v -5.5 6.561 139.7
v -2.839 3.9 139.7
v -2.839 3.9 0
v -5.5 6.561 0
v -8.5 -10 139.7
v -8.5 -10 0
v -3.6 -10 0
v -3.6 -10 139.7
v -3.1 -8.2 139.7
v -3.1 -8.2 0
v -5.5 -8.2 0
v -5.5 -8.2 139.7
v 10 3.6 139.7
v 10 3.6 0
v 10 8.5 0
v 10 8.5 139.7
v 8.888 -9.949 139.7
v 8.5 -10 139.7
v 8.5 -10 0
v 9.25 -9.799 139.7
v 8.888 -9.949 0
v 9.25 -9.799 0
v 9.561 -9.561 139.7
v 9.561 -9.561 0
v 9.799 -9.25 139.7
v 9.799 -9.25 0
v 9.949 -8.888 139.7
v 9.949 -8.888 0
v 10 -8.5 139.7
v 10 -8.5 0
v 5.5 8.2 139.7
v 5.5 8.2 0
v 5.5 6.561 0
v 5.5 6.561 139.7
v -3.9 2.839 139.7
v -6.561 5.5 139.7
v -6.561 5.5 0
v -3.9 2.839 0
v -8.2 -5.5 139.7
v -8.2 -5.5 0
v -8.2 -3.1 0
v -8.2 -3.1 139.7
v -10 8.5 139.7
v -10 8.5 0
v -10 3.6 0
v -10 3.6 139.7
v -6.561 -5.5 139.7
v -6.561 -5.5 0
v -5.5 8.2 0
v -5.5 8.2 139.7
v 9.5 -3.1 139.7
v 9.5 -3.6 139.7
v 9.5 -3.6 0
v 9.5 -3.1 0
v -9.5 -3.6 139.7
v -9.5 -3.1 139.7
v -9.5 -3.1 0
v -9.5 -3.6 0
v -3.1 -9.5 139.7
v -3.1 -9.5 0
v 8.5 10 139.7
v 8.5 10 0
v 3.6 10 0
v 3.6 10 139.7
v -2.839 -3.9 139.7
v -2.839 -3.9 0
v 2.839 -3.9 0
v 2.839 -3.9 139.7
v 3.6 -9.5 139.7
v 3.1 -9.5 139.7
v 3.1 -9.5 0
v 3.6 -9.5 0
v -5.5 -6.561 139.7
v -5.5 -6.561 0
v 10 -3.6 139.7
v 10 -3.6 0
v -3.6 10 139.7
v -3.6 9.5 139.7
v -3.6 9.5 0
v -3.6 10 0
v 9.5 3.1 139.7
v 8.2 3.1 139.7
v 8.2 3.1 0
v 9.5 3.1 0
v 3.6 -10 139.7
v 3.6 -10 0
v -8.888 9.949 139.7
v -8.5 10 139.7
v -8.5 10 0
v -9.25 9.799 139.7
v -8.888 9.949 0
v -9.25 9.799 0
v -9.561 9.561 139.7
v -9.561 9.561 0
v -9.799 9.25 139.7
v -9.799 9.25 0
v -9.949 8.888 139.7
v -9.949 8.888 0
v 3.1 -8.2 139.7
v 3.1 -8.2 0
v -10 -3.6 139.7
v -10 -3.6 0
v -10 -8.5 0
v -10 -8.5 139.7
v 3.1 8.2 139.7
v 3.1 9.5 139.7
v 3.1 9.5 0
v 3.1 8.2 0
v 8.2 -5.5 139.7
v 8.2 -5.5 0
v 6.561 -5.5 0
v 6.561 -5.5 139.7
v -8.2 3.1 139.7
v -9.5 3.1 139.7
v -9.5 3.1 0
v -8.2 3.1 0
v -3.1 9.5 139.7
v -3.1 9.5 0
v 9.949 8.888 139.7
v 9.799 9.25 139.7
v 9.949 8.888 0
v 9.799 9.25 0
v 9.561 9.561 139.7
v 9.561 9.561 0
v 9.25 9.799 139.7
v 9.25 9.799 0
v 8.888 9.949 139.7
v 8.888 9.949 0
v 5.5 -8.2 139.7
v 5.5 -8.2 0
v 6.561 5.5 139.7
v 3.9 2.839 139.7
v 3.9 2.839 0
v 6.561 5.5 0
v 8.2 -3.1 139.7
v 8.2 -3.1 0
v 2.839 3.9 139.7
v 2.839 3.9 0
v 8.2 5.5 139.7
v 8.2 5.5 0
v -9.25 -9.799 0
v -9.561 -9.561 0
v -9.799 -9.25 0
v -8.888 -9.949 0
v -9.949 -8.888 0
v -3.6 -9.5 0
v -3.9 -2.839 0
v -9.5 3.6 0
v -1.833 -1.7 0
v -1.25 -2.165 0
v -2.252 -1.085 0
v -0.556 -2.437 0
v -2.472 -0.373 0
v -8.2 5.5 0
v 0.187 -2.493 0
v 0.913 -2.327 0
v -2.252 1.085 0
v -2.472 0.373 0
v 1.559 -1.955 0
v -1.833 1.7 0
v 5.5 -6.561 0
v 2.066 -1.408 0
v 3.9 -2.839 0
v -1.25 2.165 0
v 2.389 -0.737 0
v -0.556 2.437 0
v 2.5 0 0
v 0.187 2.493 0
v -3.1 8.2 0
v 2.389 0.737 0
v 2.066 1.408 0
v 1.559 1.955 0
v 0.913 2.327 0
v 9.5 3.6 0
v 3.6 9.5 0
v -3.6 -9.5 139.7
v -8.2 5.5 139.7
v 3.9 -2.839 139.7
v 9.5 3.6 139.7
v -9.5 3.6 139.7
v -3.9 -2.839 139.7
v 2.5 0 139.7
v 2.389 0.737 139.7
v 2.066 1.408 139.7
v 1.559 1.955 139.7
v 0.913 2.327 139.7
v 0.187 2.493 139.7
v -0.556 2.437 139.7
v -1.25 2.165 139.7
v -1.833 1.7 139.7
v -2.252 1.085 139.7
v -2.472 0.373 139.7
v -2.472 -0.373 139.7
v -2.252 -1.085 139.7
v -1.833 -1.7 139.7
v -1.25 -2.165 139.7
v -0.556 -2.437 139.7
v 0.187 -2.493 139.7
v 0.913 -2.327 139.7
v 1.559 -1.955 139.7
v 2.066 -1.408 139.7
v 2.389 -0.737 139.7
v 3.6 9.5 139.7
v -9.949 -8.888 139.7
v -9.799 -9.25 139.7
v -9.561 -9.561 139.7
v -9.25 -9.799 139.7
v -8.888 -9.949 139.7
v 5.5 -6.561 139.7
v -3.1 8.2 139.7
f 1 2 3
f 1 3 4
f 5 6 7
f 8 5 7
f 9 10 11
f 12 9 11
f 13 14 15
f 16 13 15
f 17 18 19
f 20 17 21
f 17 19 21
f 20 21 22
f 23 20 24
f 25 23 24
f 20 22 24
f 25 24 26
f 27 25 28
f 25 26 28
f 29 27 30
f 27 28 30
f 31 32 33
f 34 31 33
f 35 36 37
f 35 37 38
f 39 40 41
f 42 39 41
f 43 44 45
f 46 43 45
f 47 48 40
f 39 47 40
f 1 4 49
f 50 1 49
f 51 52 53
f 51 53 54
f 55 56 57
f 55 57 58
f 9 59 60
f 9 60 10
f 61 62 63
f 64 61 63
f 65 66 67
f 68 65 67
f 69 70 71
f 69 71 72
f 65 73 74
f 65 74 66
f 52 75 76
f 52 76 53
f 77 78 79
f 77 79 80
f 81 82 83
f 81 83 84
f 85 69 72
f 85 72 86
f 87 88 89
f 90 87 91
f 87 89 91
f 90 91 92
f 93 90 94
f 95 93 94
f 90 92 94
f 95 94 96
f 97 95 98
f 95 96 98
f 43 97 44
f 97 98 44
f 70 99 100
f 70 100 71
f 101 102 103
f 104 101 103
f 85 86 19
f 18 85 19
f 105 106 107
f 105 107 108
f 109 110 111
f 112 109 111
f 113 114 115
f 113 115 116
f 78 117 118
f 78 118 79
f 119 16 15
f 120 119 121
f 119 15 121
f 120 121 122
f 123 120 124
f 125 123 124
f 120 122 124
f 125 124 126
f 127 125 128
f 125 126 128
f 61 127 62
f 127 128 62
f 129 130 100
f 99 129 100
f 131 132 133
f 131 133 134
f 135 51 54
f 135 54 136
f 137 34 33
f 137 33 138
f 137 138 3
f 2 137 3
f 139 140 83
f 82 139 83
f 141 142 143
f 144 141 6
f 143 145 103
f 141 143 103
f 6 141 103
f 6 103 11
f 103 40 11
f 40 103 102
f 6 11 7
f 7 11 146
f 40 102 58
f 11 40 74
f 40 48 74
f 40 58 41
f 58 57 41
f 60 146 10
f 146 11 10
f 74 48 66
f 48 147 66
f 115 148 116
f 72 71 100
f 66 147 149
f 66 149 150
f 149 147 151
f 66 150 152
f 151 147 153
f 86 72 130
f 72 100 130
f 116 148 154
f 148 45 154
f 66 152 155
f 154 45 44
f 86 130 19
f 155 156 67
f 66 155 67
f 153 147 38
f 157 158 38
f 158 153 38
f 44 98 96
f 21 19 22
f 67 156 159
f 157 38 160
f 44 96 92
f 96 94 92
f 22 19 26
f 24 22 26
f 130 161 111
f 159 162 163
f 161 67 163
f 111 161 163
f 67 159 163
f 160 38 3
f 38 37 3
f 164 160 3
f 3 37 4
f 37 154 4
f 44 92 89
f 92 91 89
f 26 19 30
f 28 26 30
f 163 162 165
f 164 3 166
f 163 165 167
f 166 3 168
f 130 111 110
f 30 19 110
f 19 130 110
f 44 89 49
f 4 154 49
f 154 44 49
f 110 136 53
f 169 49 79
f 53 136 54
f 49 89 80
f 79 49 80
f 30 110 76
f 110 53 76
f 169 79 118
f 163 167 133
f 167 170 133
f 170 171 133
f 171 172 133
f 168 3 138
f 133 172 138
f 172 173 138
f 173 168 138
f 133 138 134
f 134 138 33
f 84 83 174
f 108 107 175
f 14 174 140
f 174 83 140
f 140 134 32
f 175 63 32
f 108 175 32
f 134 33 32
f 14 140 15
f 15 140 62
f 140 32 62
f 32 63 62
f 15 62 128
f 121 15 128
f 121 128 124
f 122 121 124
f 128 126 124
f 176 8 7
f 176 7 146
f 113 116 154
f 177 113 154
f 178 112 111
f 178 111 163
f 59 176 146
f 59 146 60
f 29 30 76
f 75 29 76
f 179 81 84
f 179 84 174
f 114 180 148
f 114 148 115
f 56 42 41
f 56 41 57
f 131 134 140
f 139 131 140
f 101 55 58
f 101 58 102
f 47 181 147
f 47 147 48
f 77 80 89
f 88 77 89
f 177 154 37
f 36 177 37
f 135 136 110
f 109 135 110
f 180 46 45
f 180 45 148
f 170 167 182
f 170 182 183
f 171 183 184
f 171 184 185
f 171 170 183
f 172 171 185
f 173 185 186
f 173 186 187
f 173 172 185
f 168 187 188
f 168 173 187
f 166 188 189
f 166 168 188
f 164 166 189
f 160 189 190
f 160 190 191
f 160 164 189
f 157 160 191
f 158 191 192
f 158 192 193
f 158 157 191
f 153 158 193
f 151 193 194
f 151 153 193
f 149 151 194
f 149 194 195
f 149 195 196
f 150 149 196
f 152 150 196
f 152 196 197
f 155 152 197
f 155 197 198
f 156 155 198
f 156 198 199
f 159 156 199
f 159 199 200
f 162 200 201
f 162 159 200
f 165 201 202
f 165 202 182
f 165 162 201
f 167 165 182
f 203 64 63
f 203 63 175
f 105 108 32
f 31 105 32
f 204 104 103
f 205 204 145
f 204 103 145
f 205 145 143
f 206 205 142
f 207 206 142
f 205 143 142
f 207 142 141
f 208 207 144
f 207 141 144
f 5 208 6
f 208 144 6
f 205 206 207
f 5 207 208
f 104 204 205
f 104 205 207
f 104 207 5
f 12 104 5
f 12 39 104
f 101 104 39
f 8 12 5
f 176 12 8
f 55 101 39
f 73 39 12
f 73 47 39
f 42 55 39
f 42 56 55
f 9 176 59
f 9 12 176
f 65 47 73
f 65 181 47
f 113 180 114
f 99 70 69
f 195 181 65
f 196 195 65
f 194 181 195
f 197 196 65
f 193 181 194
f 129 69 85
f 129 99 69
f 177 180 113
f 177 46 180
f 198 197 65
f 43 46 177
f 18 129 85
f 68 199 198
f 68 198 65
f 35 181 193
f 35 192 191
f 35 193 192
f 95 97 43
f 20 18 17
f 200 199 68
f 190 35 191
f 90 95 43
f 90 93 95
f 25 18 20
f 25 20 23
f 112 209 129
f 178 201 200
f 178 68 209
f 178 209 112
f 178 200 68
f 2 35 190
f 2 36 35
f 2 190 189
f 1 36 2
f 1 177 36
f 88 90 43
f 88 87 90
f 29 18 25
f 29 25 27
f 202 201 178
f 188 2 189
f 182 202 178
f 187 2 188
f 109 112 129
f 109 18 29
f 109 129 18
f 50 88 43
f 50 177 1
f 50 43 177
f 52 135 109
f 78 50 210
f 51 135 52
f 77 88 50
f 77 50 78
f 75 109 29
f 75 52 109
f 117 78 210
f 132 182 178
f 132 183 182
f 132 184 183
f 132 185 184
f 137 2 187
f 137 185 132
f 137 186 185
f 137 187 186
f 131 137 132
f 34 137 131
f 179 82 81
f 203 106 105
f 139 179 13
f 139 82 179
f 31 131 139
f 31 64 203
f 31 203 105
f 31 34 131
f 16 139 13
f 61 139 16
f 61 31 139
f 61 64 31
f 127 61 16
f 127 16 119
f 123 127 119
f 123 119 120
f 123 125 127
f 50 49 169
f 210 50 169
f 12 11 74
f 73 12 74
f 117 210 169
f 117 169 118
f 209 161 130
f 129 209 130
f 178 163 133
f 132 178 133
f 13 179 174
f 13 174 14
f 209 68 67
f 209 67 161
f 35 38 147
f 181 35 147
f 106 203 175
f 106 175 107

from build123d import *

# Parameters (mm, degrees)
SKETCH1_R           = 2.5
BOSS_EXTRUDE1_DEPTH = 139.7


with BuildPart() as part:
    # Sketch1 → Boss-Extrude1 (new body)
    with BuildSketch(Plane.XY):
        with BuildLine():
            Line((-10, -3.6), (-10, -8.5))
            ThreePointArc((-10, -8.5), (-9.560660172, -9.560660172), (-8.5, -10))
            Line((-8.5, -10), (-3.6, -10))
            Line((-3.6, -10), (-3.6, -9.5))
            Line((-3.6, -9.5), (-3.1, -9.5))
            Line((-3.1, -9.5), (-3.1, -8.2))
            Line((-3.1, -8.2), (-5.5, -8.2))
            Line((-5.5, -8.2), (-5.5, -6.560660172))
            Line((-5.5, -6.560660172), (-2.839339828, -3.9))
            Line((-2.839339828, -3.9), (0, -3.9))
            Line((0, -3.9), (2.839339828, -3.9))
            Line((2.839339828, -3.9), (5.5, -6.560660172))
            Line((5.5, -6.560660172), (5.5, -8.2))
            Line((5.5, -8.2), (3.1, -8.2))
            Line((3.1, -8.2), (3.1, -9.5))
            Line((3.1, -9.5), (3.6, -9.5))
            Line((3.6, -9.5), (3.6, -10))
            Line((3.6, -10), (8.5, -10))
            ThreePointArc((8.5, -10), (9.560660172, -9.560660172), (10, -8.5))
            Line((10, -8.5), (10, -3.6))
            Line((10, -3.6), (9.5, -3.6))
            Line((9.5, -3.6), (9.5, -3.1))
            Line((9.5, -3.1), (8.2, -3.1))
            Line((8.2, -3.1), (8.2, -5.5))
            Line((8.2, -5.5), (6.560660172, -5.5))
            Line((6.560660172, -5.5), (3.9, -2.839339828))
            Line((3.9, -2.839339828), (3.9, 2.839339828))
            Line((3.9, 2.839339828), (6.560660172, 5.5))
            Line((6.560660172, 5.5), (8.2, 5.5))
            Line((8.2, 5.5), (8.2, 3.1))
            Line((8.2, 3.1), (9.5, 3.1))
            Line((9.5, 3.1), (9.5, 3.6))
            Line((9.5, 3.6), (10, 3.6))
            Line((10, 3.6), (10, 8.5))
            ThreePointArc((10, 8.5), (9.560660172, 9.560660172), (8.5, 10))
            Line((8.5, 10), (3.6, 10))
            Line((3.6, 10), (3.6, 9.5))
            Line((3.6, 9.5), (3.1, 9.5))
            Line((3.1, 9.5), (3.1, 8.2))
            Line((3.1, 8.2), (5.5, 8.2))
            Line((5.5, 8.2), (5.5, 6.560660172))
            Line((5.5, 6.560660172), (2.839339828, 3.9))
            Line((2.839339828, 3.9), (0, 3.9))
            Line((0, 3.9), (-2.839339828, 3.9))
            Line((-2.839339828, 3.9), (-5.5, 6.560660172))
            Line((-5.5, 6.560660172), (-5.5, 8.2))
            Line((-5.5, 8.2), (-3.1, 8.2))
            Line((-3.1, 8.2), (-3.1, 9.5))
            Line((-3.1, 9.5), (-3.6, 9.5))
            Line((-3.6, 9.5), (-3.6, 10))
            Line((-3.6, 10), (-8.5, 10))
            ThreePointArc((-8.5, 10), (-9.560660172, 9.560660172), (-10, 8.5))
            Line((-10, 8.5), (-10, 3.6))
            Line((-10, 3.6), (-9.5, 3.6))
            Line((-9.5, 3.6), (-9.5, 3.1))
            Line((-9.5, 3.1), (-8.2, 3.1))
            Line((-8.2, 3.1), (-8.2, 5.5))
            Line((-8.2, 5.5), (-6.560660172, 5.5))
            Line((-6.560660172, 5.5), (-3.9, 2.839339828))
            Line((-3.9, 2.839339828), (-3.9, -2.839339828))
            Line((-3.9, -2.839339828), (-6.560660172, -5.5))
            Line((-6.560660172, -5.5), (-8.2, -5.5))
            Line((-8.2, -5.5), (-8.2, -3.1))
            Line((-8.2, -3.1), (-9.5, -3.1))
            Line((-9.5, -3.1), (-9.5, -3.6))
            Line((-9.5, -3.6), (-10, -3.6))
        make_face()
        Circle(SKETCH1_R, mode=Mode.SUBTRACT)
    extrude(amount=BOSS_EXTRUDE1_DEPTH)


solid = part.part
